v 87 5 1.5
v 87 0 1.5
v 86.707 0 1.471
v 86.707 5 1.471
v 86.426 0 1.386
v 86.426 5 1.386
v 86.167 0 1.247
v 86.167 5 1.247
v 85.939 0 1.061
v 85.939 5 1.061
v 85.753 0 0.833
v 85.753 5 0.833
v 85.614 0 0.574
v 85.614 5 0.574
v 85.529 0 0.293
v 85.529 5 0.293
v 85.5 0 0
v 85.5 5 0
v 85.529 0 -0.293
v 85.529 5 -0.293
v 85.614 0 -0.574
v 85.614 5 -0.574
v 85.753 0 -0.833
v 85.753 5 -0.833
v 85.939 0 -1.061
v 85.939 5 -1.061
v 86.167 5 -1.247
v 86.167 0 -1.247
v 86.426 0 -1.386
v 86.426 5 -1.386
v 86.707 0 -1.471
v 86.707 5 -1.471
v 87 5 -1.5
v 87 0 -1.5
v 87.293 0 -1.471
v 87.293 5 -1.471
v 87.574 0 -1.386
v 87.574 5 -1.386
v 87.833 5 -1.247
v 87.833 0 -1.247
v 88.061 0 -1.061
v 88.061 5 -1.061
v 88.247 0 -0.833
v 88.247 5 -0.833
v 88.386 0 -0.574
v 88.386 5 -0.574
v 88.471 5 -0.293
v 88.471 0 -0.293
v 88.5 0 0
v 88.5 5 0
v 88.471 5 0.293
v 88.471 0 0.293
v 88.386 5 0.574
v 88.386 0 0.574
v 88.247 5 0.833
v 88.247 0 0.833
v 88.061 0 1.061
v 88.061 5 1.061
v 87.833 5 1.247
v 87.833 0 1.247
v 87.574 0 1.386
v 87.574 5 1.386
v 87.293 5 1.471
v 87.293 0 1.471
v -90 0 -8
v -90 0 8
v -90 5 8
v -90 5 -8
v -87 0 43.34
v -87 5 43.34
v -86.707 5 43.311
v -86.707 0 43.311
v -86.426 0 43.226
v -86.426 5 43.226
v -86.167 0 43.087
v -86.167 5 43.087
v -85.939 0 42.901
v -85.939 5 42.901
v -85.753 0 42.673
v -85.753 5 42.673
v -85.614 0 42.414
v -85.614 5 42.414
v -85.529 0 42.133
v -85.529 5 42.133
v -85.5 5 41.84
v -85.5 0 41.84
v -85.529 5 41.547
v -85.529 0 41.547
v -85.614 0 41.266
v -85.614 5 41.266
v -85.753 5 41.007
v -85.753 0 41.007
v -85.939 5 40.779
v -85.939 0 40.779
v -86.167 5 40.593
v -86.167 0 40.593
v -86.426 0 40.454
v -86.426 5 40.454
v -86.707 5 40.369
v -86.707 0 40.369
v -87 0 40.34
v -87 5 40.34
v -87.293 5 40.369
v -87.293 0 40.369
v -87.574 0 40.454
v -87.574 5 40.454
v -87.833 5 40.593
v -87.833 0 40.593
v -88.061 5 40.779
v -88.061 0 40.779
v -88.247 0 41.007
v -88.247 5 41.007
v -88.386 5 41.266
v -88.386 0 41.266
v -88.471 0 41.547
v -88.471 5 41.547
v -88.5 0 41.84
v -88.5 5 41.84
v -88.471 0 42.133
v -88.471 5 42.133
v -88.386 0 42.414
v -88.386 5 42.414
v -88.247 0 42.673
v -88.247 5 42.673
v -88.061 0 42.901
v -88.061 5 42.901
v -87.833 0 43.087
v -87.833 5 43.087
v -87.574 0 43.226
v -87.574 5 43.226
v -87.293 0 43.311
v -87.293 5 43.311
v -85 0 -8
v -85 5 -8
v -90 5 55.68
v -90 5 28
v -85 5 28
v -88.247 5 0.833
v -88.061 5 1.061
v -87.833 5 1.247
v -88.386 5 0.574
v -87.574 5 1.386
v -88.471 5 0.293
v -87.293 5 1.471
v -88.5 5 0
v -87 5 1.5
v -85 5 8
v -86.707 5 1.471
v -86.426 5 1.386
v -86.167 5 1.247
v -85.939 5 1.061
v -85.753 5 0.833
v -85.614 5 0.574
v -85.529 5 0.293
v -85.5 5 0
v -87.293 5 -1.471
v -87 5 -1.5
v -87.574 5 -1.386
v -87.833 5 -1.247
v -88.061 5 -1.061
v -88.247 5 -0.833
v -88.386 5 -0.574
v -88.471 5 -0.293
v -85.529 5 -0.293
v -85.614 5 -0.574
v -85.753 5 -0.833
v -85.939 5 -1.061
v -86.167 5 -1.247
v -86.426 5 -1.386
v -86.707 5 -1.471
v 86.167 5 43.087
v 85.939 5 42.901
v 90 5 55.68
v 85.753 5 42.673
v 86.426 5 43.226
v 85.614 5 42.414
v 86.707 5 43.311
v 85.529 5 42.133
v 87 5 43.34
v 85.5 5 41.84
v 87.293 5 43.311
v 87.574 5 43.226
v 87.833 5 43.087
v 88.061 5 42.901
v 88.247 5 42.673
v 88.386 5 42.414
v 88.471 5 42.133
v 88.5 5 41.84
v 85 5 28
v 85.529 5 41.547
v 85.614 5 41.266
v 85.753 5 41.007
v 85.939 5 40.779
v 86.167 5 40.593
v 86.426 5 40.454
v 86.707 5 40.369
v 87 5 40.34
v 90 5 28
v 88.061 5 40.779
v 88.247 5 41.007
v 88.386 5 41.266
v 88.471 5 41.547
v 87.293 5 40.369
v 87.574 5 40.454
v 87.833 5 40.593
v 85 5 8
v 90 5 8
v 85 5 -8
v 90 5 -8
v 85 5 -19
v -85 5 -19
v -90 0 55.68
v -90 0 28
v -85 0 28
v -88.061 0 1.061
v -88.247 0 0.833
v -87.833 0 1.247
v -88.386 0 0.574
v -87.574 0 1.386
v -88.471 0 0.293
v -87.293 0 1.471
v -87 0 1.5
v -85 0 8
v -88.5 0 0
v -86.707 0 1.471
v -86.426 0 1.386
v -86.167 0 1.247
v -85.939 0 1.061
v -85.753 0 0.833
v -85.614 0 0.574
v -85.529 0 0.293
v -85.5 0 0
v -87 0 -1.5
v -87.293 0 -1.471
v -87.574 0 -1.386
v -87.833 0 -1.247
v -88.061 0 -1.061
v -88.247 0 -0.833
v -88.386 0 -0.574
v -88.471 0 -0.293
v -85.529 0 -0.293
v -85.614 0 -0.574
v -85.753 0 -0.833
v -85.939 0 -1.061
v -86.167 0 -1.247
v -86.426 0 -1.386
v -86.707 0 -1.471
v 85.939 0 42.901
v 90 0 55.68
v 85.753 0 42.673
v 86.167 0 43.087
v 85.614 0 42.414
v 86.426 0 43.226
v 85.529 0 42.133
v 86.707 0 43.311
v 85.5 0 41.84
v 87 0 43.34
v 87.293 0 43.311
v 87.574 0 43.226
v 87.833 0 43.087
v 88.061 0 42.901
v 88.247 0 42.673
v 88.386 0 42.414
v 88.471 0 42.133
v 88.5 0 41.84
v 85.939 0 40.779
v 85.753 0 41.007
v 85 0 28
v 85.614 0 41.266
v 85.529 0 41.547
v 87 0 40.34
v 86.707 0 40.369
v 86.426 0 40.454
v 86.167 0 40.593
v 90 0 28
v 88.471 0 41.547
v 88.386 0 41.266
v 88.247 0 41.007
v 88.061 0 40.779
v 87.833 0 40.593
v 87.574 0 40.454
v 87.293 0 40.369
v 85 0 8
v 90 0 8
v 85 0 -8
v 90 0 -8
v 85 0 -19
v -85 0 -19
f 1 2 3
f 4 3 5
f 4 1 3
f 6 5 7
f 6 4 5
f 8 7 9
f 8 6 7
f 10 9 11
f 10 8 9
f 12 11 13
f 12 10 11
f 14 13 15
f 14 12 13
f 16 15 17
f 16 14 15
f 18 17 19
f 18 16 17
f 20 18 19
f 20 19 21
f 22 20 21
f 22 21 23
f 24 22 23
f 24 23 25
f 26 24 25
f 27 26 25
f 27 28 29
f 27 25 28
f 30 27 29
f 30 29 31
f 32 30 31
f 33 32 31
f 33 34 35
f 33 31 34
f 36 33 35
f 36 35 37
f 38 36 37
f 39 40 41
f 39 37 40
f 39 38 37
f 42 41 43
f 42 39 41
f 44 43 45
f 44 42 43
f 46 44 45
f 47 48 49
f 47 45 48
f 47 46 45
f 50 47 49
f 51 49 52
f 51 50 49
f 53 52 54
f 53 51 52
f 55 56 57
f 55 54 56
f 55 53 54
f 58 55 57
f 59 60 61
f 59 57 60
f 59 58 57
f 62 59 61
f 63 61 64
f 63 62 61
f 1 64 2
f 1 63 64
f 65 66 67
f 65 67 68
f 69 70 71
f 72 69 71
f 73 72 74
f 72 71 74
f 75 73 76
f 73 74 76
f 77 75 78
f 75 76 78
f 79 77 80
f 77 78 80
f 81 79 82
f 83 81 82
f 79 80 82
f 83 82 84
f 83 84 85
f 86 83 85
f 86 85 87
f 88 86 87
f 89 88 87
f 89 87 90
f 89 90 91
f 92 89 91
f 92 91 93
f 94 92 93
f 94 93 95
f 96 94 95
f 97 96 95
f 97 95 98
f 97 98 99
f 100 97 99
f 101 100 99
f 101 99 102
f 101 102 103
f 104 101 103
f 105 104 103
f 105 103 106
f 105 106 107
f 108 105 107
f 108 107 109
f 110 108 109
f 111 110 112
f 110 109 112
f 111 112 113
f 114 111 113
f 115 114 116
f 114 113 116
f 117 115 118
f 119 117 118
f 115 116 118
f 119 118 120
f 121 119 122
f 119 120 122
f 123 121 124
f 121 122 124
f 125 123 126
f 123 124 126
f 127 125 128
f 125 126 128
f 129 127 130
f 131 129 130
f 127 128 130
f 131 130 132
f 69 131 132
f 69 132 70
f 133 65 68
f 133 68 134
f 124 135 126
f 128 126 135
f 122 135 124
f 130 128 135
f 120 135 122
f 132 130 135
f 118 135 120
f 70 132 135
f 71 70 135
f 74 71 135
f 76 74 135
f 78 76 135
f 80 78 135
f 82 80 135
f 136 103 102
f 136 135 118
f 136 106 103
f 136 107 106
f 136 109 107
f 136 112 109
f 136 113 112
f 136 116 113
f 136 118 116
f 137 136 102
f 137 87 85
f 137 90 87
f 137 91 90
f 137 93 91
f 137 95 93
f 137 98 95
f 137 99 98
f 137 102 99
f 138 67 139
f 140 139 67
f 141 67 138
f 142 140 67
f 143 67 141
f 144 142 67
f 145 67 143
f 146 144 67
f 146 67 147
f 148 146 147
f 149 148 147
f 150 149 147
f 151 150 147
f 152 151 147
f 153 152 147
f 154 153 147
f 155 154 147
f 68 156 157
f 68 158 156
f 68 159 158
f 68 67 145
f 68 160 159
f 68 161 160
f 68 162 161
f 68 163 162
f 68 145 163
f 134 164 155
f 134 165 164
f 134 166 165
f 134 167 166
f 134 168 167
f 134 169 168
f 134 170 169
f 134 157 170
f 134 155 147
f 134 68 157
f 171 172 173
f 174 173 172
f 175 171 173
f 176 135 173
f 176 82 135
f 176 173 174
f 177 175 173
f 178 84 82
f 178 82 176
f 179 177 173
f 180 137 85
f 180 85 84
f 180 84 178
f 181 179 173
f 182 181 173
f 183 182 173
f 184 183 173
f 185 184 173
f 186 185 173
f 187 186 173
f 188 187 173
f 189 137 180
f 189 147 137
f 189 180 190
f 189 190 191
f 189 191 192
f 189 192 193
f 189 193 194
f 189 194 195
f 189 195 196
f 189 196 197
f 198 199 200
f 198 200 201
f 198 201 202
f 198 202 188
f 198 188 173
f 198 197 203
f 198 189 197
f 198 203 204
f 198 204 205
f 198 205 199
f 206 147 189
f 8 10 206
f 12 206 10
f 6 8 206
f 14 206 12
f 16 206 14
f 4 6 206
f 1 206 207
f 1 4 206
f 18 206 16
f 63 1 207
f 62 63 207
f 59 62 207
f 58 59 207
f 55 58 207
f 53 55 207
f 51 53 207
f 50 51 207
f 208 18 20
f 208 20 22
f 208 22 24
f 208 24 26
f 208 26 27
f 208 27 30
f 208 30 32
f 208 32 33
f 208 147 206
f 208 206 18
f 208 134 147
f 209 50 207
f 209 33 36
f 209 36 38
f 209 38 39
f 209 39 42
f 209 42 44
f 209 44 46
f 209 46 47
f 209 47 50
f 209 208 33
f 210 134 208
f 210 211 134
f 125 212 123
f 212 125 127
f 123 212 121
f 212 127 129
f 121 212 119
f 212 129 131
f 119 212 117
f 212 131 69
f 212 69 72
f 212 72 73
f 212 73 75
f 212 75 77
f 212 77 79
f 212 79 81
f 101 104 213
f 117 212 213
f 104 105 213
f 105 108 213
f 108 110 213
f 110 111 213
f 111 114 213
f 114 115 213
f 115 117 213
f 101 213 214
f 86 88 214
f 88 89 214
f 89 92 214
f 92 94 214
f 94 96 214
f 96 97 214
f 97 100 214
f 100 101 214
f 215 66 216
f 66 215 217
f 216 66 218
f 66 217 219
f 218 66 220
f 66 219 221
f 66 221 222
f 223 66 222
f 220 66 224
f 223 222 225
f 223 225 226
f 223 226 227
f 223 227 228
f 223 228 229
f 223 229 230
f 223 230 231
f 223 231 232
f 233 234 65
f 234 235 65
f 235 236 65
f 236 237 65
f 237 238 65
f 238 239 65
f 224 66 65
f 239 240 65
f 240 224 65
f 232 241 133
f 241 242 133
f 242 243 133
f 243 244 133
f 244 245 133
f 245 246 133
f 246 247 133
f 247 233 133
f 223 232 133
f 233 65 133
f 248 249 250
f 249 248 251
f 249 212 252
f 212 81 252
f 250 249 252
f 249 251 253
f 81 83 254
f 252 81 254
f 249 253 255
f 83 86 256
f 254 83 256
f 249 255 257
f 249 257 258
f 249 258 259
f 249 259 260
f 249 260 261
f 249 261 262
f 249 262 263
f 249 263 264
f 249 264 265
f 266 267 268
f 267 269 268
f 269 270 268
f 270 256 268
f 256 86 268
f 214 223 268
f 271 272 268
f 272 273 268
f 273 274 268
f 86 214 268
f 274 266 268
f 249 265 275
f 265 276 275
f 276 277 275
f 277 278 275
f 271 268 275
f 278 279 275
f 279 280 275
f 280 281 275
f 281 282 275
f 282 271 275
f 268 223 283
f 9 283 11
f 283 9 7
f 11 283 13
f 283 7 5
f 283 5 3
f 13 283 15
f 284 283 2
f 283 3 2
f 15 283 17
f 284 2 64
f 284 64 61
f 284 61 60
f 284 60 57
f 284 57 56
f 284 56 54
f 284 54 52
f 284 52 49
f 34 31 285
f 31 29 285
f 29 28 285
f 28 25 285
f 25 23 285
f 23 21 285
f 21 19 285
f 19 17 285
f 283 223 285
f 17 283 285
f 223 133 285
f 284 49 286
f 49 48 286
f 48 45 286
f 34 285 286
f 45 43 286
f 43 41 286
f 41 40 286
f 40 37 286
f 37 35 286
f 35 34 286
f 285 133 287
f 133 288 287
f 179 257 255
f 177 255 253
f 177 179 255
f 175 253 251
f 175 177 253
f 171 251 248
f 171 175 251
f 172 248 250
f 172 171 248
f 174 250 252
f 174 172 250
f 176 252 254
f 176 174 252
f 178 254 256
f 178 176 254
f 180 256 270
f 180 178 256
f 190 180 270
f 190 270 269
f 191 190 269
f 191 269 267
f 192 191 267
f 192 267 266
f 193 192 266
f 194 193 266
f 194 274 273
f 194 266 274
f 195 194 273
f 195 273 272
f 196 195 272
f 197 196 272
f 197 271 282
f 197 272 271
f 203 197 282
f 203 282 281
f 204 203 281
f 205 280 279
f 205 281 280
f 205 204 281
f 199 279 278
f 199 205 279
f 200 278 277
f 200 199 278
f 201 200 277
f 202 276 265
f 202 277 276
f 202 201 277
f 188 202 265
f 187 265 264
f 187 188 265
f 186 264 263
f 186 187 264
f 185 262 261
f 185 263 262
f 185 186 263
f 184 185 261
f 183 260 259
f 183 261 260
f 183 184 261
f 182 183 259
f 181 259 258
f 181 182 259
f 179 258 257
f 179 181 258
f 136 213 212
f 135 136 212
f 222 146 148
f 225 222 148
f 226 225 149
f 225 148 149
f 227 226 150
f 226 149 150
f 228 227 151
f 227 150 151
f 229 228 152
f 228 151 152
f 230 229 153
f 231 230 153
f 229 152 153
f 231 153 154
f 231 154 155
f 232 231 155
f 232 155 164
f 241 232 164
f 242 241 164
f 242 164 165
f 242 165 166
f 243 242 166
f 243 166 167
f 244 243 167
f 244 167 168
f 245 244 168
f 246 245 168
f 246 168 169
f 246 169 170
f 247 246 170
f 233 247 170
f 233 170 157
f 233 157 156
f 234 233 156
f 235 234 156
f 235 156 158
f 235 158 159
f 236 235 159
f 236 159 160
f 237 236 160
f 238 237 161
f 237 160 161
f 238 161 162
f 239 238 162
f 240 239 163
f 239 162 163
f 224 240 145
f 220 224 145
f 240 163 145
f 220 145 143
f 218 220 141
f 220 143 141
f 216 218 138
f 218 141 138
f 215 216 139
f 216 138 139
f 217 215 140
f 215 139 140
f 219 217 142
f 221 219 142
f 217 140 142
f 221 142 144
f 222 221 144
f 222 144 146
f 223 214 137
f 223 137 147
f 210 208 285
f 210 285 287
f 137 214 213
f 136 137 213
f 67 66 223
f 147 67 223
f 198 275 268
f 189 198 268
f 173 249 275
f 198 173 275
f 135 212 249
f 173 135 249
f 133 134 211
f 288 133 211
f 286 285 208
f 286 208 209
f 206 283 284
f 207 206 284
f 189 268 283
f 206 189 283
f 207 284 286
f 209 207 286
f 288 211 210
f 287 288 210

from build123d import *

# Parameters (mm, degrees)
CROQUIS1_W              = 170
CROQUIS1_H              = 20
CROQUIS1_W_2            = 180
CROQUIS1_H_2            = 16
SALIENTE_EXTRUIR1_DEPTH = 5
CROQUIS2_R              = 1.5
CORTAR_EXTRUIR1_DEPTH   = 106.949338837
CROQUIS3_W              = 170
CROQUIS3_H              = 15
SALIENTE_EXTRUIR2_DEPTH = 5
CROQUIS5_W              = 170
CROQUIS5_H              = 4
CORTAR_EXTRUIR3_DEPTH   = 106.949338837


with BuildPart() as part:
    # Croquis1 → Saliente-Extruir1 (new body)
    with BuildSketch(Plane(origin=(0, 0, 0), x_dir=(1, 0, 0), z_dir=(0, 1, 0))):
        Polygon((90, -28), (85, -28), (-85, -28), (-90, -28), (-90, -55.68), (90, -55.68), align=None)
        with Locations((0, -18)):
            Rectangle(CROQUIS1_W, CROQUIS1_H)
        Rectangle(CROQUIS1_W_2, CROQUIS1_H_2)
    extrude(amount=SALIENTE_EXTRUIR1_DEPTH)

    # Croquis2 → Cortar-Extruir1 (cut, through all)
    with BuildSketch(Plane(origin=(0, 5, 0), x_dir=(1, 0, 0), z_dir=(0, 1, 0))):
        with Locations(Location((-87, 0, 0), (0, 0, 270))):
            Circle(CROQUIS2_R)
        with Locations(Location((-87, -41.84, 0), (0, 0, 270))):
            Circle(CROQUIS2_R)
    cortar_extruir1 = extrude(amount=-CORTAR_EXTRUIR1_DEPTH, mode=Mode.SUBTRACT)

    # Simetría1: Cortar-Extruir1 across plane
    add(cortar_extruir1.mirror(Plane(origin=(0, 0, 0), x_dir=(0, 0, 1), z_dir=(1, 0, 0))), mode=Mode.SUBTRACT)

    # Croquis3 → Saliente-Extruir2 (add)
    with BuildSketch(Plane(origin=(0, 5, 0), x_dir=(1, 0, 0), z_dir=(0, 1, 0))):
        with Locations((0, 15.5)):
            Rectangle(CROQUIS3_W, CROQUIS3_H)
    extrude(amount=-SALIENTE_EXTRUIR2_DEPTH)

    # Croquis5 → Cortar-Extruir3 (cut, through all)
    with BuildSketch(Plane(origin=(0, 5, 0), x_dir=(1, 0, 0), z_dir=(0, 1, 0))):
        with Locations((0, 21)):
            Rectangle(CROQUIS5_W, CROQUIS5_H)
    extrude(amount=-CORTAR_EXTRUIR3_DEPTH, mode=Mode.SUBTRACT)


solid = part.part
